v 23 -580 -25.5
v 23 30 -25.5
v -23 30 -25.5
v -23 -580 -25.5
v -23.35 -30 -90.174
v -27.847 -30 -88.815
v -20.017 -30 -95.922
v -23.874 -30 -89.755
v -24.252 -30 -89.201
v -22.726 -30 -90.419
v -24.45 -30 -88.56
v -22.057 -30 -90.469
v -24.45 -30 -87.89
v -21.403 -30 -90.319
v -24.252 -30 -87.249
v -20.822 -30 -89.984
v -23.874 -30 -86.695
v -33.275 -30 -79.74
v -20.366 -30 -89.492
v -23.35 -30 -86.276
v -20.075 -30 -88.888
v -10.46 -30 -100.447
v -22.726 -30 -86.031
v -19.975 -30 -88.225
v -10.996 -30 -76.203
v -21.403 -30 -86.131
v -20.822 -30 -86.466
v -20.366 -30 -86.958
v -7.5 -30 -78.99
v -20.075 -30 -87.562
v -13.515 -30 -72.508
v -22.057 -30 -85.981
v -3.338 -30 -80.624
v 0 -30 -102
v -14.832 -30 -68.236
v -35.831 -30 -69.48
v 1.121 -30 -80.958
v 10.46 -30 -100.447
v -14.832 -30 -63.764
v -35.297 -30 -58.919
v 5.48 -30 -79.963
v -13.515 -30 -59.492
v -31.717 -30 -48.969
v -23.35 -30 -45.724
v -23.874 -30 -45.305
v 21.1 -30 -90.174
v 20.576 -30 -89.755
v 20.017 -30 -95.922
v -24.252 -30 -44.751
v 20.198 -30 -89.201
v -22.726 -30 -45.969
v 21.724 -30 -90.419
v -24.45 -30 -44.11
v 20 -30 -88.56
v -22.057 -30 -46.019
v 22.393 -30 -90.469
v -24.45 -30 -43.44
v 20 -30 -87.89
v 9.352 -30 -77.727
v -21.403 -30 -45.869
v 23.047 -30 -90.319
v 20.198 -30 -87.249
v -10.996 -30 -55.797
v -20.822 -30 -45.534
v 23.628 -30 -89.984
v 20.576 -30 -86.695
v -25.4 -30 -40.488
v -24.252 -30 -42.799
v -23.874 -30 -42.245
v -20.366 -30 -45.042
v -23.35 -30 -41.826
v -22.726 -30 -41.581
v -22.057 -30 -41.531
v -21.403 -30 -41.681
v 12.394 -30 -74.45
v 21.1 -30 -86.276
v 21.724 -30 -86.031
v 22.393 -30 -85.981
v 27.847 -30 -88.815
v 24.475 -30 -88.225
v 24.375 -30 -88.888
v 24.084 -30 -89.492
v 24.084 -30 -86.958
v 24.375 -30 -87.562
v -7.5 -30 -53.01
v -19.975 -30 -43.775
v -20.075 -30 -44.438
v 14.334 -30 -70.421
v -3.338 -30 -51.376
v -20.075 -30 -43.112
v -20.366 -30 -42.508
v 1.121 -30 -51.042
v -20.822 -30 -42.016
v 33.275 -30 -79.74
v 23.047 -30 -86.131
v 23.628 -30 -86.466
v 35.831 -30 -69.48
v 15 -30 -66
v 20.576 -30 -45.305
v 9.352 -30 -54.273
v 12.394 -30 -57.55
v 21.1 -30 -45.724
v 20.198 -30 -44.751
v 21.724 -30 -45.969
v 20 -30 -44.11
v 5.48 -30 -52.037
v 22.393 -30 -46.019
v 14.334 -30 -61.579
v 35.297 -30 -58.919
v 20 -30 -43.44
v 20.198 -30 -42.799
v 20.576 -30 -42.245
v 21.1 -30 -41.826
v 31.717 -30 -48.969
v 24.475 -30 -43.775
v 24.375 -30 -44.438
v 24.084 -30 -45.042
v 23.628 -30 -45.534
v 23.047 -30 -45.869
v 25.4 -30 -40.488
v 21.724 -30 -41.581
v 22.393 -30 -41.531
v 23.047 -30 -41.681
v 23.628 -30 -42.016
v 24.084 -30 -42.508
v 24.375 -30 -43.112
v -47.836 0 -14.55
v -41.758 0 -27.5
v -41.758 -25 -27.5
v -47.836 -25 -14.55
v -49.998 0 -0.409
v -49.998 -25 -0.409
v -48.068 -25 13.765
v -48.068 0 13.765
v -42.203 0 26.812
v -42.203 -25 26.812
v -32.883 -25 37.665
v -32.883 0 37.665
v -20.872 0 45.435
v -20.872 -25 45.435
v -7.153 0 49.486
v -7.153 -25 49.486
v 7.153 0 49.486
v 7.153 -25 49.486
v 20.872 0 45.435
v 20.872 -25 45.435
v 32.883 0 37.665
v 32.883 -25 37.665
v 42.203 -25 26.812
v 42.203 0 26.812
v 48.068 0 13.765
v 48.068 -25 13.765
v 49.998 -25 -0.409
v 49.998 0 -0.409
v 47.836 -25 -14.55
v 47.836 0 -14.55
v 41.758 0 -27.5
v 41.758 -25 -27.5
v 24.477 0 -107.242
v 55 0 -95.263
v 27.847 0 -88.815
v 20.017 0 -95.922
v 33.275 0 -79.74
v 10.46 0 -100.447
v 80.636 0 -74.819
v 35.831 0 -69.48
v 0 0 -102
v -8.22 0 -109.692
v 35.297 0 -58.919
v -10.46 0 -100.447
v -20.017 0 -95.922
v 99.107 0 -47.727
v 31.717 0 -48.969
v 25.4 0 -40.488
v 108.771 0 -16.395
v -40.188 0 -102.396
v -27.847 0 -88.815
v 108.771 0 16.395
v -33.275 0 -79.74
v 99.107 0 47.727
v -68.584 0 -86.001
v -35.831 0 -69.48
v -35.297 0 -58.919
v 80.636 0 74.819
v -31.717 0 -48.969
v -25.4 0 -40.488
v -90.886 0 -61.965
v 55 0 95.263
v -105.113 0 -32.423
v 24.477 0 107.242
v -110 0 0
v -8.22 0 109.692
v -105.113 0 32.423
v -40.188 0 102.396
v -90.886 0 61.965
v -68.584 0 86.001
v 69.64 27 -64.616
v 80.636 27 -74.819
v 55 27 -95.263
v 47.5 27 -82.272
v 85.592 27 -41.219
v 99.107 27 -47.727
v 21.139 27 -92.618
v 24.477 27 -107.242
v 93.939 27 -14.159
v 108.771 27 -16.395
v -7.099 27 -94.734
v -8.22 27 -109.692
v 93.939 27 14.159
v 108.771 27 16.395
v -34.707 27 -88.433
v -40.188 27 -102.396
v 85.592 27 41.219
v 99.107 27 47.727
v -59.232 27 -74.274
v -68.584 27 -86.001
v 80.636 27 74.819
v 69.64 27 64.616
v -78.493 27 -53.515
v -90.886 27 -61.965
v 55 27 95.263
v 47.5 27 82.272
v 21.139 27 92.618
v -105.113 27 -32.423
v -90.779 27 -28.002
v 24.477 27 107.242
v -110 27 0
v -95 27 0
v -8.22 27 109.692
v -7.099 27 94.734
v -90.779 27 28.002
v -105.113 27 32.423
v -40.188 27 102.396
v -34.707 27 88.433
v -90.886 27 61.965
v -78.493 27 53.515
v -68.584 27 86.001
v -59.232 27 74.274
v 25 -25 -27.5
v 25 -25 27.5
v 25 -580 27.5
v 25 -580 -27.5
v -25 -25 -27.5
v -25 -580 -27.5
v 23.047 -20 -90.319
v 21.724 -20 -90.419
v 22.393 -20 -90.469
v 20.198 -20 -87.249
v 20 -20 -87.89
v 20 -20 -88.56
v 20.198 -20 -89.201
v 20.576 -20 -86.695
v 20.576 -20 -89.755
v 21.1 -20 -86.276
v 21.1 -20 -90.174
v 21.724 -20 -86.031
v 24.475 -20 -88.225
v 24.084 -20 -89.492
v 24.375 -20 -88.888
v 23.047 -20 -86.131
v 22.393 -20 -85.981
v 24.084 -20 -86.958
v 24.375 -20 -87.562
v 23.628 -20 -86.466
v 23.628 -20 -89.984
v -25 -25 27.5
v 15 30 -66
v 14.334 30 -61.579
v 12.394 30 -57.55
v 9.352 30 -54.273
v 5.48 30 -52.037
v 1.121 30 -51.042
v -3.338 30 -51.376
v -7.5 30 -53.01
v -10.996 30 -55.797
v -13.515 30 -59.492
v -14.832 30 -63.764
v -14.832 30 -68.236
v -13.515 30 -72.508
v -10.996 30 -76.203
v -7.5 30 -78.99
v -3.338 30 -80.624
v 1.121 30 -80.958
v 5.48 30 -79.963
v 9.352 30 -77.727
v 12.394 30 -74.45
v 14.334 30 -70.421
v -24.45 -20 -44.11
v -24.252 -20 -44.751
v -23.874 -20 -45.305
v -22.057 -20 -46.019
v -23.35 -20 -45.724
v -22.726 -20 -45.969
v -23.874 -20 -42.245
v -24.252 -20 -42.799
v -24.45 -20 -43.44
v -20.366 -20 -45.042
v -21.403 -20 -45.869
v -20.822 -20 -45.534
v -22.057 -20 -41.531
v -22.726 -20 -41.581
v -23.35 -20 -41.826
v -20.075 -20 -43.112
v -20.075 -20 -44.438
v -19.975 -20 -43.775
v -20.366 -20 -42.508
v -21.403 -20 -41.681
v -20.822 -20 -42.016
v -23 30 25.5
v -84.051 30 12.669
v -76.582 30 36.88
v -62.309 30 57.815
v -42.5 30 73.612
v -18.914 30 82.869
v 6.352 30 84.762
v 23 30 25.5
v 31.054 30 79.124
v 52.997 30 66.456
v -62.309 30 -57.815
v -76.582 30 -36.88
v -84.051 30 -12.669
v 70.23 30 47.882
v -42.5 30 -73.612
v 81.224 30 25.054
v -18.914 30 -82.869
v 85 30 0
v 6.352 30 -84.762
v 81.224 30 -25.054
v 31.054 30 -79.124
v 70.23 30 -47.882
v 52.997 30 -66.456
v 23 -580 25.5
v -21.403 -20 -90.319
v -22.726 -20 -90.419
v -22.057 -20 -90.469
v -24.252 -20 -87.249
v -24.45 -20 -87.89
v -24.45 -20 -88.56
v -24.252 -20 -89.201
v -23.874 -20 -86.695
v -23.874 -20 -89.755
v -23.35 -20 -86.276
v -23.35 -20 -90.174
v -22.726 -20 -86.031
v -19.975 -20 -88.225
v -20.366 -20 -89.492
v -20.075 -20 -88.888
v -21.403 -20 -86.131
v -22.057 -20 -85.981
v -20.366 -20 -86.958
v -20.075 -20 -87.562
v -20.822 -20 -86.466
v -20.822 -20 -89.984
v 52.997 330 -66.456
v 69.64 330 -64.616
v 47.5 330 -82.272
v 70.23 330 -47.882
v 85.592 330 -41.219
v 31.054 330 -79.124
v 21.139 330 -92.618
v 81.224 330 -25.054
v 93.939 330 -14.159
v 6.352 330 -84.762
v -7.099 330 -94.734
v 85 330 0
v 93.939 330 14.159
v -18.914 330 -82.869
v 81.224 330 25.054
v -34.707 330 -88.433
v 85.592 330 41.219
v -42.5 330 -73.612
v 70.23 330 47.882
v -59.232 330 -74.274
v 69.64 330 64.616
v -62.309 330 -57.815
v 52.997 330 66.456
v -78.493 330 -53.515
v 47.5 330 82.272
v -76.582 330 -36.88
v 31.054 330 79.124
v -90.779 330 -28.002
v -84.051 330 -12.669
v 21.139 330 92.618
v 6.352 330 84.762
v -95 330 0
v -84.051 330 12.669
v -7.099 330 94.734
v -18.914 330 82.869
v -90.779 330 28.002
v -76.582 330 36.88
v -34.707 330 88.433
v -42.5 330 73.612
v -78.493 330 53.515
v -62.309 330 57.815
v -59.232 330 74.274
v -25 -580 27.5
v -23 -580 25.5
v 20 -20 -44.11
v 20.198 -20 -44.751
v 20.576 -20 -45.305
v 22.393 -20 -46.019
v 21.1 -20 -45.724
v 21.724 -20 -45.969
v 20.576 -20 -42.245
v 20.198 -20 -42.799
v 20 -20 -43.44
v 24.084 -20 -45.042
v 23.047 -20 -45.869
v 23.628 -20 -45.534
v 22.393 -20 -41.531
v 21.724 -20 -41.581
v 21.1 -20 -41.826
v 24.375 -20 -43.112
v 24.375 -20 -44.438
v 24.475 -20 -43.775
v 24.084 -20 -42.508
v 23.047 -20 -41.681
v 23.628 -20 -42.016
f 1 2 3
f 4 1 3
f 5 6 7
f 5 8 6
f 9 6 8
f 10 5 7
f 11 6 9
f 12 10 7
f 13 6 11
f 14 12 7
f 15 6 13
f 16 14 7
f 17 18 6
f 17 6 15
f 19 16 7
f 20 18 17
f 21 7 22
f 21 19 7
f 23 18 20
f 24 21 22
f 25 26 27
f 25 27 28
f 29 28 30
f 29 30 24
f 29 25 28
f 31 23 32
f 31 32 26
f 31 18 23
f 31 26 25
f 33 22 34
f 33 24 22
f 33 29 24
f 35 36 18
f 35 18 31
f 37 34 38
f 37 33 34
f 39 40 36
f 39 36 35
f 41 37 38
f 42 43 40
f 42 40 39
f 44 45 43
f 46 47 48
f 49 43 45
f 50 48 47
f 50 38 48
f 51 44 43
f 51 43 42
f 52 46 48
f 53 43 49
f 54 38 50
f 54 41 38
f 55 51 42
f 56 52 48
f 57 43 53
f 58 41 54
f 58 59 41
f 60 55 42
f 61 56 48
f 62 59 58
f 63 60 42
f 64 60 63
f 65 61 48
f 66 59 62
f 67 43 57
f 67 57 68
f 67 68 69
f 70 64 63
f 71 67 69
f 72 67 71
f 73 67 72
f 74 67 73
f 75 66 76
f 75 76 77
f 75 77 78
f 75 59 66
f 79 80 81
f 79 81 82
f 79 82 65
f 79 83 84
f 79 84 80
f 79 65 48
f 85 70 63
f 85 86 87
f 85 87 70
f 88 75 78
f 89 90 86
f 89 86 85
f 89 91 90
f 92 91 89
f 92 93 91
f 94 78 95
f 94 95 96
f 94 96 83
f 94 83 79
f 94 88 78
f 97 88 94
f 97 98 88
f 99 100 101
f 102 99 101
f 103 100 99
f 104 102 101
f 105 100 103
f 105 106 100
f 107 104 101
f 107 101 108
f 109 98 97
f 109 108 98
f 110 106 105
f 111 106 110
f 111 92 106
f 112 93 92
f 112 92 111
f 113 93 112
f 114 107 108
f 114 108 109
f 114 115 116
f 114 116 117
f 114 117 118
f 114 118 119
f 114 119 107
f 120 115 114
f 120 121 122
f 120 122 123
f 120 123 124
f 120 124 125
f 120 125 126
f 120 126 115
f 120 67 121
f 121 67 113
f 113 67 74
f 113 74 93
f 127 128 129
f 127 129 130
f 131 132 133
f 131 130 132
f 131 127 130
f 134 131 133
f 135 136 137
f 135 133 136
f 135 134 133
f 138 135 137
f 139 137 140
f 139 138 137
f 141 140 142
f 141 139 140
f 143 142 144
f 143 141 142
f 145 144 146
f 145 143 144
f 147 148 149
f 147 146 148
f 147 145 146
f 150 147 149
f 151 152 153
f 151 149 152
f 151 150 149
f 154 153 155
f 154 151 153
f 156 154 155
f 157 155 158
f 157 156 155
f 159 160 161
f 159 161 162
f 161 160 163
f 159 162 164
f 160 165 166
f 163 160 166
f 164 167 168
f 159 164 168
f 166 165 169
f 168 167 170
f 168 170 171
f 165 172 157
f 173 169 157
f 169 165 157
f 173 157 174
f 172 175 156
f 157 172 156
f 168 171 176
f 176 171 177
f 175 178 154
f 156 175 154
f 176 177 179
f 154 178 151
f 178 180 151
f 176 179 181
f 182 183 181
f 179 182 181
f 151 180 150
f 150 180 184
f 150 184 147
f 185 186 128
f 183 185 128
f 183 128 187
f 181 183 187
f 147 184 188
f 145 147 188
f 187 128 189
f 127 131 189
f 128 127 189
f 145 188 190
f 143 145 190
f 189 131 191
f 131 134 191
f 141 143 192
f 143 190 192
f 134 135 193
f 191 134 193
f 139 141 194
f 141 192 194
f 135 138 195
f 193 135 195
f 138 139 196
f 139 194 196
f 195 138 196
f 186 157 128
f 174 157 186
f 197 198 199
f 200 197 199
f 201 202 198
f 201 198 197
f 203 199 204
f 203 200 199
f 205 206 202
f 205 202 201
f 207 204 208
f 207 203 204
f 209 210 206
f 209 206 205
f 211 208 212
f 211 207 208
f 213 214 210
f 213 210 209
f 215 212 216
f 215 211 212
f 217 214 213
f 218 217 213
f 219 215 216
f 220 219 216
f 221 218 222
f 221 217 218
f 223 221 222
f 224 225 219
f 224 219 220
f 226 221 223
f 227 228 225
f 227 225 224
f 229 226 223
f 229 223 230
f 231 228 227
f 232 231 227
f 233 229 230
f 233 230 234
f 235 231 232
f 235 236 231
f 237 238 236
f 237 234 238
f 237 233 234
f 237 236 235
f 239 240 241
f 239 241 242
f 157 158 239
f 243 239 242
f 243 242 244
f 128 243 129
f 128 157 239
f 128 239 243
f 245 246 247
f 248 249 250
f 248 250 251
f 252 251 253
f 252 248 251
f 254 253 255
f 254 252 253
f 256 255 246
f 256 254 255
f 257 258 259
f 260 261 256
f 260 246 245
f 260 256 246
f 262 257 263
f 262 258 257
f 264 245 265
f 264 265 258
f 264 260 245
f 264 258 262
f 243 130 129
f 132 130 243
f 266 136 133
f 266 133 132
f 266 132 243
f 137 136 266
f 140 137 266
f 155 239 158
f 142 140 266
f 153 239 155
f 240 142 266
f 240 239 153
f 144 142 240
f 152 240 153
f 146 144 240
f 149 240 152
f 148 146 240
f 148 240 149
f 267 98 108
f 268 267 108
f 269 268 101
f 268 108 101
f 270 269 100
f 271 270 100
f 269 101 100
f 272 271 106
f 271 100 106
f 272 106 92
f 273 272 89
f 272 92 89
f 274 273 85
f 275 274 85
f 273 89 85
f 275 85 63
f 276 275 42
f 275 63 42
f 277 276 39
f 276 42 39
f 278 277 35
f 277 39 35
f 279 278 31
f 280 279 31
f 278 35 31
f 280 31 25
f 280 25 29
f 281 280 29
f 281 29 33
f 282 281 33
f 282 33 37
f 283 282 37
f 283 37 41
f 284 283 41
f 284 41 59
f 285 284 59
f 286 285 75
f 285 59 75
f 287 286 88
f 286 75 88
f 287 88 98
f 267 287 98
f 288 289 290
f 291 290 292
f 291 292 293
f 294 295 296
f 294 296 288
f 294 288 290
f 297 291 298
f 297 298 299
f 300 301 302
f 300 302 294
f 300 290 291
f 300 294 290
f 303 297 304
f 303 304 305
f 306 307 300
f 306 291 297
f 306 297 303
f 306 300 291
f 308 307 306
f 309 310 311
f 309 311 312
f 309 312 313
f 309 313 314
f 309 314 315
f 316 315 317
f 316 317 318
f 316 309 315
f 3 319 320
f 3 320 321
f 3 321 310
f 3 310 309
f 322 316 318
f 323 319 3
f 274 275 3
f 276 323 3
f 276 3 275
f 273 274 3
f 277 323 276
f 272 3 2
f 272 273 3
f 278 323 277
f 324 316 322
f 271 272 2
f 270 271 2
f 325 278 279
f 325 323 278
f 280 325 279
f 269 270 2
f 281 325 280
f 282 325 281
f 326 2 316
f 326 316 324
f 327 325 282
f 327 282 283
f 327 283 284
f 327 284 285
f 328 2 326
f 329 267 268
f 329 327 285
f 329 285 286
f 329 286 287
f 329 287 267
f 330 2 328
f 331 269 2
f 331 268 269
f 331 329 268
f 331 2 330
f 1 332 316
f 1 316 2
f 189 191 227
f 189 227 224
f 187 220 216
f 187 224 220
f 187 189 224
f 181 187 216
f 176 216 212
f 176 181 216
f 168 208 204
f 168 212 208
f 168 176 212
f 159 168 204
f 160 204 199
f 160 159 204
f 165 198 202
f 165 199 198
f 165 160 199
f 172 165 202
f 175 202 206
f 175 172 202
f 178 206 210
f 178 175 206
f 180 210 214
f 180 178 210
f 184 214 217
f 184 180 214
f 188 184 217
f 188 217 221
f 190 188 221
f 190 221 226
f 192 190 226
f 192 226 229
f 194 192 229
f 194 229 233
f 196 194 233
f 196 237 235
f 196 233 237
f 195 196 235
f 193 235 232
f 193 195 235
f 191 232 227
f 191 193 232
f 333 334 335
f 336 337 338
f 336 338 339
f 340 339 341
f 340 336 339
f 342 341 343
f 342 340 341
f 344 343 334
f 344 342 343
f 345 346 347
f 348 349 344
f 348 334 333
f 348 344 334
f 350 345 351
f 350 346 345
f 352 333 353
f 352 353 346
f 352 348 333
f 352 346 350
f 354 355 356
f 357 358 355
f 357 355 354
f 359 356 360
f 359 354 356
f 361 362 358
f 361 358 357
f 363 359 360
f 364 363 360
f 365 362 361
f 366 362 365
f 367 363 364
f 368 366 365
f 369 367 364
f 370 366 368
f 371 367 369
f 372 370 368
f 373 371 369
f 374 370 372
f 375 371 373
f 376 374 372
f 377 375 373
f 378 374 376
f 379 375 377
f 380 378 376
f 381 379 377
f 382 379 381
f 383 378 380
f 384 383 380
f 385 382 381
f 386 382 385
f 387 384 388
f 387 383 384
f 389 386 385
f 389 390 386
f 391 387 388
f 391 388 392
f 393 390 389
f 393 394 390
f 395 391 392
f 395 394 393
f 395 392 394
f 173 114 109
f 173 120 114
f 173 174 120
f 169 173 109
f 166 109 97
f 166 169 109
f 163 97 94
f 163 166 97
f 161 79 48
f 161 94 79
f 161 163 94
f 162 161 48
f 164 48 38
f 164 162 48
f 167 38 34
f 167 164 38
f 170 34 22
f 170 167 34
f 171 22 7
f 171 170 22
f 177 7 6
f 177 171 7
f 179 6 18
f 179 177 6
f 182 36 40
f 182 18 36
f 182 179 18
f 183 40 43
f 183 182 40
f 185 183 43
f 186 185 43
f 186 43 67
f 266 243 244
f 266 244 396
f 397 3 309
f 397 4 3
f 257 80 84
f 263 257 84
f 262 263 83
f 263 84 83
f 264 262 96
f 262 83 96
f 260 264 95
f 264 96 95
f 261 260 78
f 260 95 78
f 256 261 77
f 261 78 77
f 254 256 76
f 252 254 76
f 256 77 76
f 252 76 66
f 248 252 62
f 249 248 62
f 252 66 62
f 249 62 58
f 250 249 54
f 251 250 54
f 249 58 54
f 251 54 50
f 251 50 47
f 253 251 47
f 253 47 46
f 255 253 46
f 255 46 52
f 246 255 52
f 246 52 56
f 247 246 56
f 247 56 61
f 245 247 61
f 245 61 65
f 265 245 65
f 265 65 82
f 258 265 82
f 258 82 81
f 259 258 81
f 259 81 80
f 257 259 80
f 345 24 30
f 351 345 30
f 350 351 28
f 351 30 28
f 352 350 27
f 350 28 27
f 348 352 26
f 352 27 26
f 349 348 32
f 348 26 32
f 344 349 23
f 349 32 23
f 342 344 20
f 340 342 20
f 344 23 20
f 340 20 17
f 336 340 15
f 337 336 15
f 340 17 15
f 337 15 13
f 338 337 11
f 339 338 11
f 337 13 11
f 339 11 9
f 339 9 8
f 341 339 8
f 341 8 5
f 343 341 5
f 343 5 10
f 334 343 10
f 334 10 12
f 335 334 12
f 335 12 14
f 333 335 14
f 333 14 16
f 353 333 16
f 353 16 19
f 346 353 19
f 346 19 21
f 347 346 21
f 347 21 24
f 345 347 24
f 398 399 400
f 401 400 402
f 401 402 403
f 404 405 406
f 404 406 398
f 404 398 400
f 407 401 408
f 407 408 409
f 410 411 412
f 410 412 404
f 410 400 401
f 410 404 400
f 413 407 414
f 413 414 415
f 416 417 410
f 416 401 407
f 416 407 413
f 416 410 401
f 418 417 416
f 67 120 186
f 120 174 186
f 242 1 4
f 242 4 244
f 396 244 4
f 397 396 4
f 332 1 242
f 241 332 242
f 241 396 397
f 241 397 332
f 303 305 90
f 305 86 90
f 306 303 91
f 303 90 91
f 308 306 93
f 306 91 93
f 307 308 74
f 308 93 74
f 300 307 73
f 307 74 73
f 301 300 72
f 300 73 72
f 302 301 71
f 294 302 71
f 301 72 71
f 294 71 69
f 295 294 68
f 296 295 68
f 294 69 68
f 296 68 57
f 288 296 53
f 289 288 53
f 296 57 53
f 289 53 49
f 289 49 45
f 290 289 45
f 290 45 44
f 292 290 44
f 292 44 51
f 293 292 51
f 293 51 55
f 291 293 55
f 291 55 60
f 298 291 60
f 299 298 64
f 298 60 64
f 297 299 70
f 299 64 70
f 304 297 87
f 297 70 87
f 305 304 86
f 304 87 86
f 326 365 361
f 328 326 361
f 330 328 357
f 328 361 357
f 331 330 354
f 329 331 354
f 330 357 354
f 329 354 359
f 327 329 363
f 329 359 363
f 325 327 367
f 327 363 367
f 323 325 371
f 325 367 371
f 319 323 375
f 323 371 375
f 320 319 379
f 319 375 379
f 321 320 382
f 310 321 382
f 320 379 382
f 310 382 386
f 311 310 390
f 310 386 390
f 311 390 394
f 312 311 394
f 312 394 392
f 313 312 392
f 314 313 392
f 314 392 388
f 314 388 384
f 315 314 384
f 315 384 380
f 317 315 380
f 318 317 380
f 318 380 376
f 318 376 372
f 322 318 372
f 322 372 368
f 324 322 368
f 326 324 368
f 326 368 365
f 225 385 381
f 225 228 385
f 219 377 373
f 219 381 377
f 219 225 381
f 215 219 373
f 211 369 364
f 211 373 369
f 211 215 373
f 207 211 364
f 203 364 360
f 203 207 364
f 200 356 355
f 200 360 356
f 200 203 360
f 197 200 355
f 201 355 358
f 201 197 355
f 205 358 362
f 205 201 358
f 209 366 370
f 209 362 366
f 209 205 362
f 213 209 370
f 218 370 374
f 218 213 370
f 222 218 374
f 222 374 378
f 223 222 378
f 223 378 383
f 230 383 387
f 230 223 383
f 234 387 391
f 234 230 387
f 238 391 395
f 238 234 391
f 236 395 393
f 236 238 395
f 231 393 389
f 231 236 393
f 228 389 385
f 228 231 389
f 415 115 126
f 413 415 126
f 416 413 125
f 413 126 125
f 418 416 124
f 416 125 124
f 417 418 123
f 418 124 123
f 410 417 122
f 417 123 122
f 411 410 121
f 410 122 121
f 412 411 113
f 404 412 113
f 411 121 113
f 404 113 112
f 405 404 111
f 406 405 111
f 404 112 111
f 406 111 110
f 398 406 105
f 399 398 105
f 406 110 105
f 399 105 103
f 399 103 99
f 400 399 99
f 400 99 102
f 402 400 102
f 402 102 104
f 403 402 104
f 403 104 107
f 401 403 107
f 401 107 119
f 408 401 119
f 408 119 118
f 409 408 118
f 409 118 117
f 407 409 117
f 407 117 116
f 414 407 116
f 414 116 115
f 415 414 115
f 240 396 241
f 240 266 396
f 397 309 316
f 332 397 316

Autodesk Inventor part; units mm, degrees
ref_plane "YZ Plane" through (0, 0, 0) normal (1, 0, 0) x (0, 1, 0)
ref_plane "XZ Plane" through (0, 0, 0) normal (0, 1, 0) x (-1, 0, 0)
ref_plane "XY Plane" through (0, 0, 0) normal (0, 0, 1) x (1, 0, 0)
sketch "Sketch1" plane through (0, 0, 0) normal (0, 1, 0) x (-1, 0, 0)
  circle A0 centre (0, 0) radius 110
  circle A1 centre (0, 0) radius 95
  dimension "d0" = 220
  dimension "d1" = 190
extrude "Extrusion1" add sketch "Sketch1" along normal blind 330 contours A1
extrude "Extrusion2" add sketch "Sketch1" along normal blind 27
sketch "Sketch2" plane through (0, 330, 0) normal (0, 1, 0) x (1, 0, 0)
  circle A0 centre (0, 0) radius 85
  dimension "d6" = 170
extrude "Extrusion3" cut sketch "Sketch2" against normal blind 300
sketch "Sketch3" plane through (0, 0, 0) normal (0, -1, 0) x (1, 0, 0)
  arc A0 (-25.4, -40.4884) -> (25.4, -40.4884) centre (0, -66) ccw
  circle A1 centre (0, 0) radius 110 projected
  line L0 (25.4, -40.4884) -> (-25.4, -40.4884)
  line L1 (25, -27.5) -> (-25, -27.5)
  line L2 (-25, -27.5) -> (-25, 27.5)
  line L3 (-25, 27.5) -> (25, 27.5)
  line L4 (25, 27.5) -> (25, -27.5)
  line L5 (25, -27.5) -> (-25, 27.5) construction
  line L6 (-25, -27.5) -> (25, 27.5) construction
  arc A2 (41.7582, -27.5) -> (-41.7582, -27.5) centre (0, 0) ccw
  line L7 (25, -27.5) -> (41.7582, -27.5)
  line L8 (-25, -27.5) -> (-41.7582, -27.5)
  dimension "d9" = 72
  dimension "d10" = 66
  dimension "d11" = 50
  dimension "d12" = 55
  dimension "d13" = 100
extrude "Extrusion4" add sketch "Sketch3" along normal blind 25 contours L1 L2 L3 L4 | L4 L3 L2 L8 A2 L7
extrude "Extrusion5" add sketch "Sketch3" along normal blind 580 contours L1 L2 L3 L4
extrude "Extrusion6" add sketch "Sketch3" along normal blind 30 contours L0 A0
sketch "Sketch4" plane through (0, -580, 0) normal (0, -1, 0) x (1, 0, 0)
  line L0 (-25, 27.5) -> (25, 27.5) projected
  line L1 (-25, -27.5) -> (25, -27.5)
  line L2 (25, -27.5) -> (25, 27.5)
  line L3 (25, 27.5) -> (-25, 27.5)
  line L4 (-25, 27.5) -> (-25, -27.5)
  line L5 (-25, -27.5) -> (25, 27.5) construction
  line L6 (25, -27.5) -> (-25, 27.5) construction
  line L7 (23, 25.5) -> (23, -25.5)
  line L8 (23, -25.5) -> (-23, -25.5)
  line L9 (-23, -25.5) -> (-23, 25.5)
  line L10 (-23, 25.5) -> (23, 25.5)
  point P0 (0, 0)
  dimension "d20" = 2
extrude "Extrusion7" cut sketch "Sketch4" against normal through all contours L7 L8 L9 L10
sketch "Sketch5" plane through (0, -30, 0) normal (0, -1, 0) x (1, 0, 0)
  arc A0 (-25.4, -40.4884) -> (25.4, -40.4884) centre (0, -66) ccw projected
  circle A1 centre (0, -66) radius 36
  line L0 (-25.4, -40.4884) -> (25.4, -40.4884) projected
  line L1 (25.4, -40.4884) -> (-25.4, -40.4884)
  circle A2 centre (0, -66) radius 32.5
  line L2 (22.225, -43.775) -> (-22.225, -43.775)
  line L3 (-22.225, -43.775) -> (-22.225, -88.225)
  line L4 (-22.225, -88.225) -> (22.225, -88.225)
  line L5 (22.225, -88.225) -> (22.225, -43.775)
  line L6 (22.225, -43.775) -> (-22.225, -88.225) construction
  line L7 (-22.225, -43.775) -> (22.225, -88.225) construction
  circle A3 centre (-22.225, -88.225) radius 2.25
  circle A4 centre (-22.225, -43.775) radius 2.25
  circle A5 centre (22.225, -88.225) radius 2.25
  circle A6 centre (22.225, -43.775) radius 2.25
  circle A7 centre (0, -66) radius 15
  point P0 (0, 0)
  dimension "d23" = 65
  dimension "d24" = 44.45
  dimension "d25" = 4.5
  dimension "d26" = 4.5
  dimension "d27" = 4.5
  dimension "d28" = 4.5
  dimension "d29" = 30
extrude "Extrusion8" cut sketch "Sketch5" against normal blind 10 contours A4 L2 L3 A2 | A2 A4 | A6 A2 | A2 A6 L5 L2 | A4 L3 L2 | L2 L5 A6 | A3 L3 L4 A2 | A2 A3 | A3 L4 L3 | A5 A2 | A2 A5 L4 L5 | L5 L4 A5
extrude "Extrusion9" cut sketch "Sketch5" against normal through all contours A7
properties part number "Plunger"
